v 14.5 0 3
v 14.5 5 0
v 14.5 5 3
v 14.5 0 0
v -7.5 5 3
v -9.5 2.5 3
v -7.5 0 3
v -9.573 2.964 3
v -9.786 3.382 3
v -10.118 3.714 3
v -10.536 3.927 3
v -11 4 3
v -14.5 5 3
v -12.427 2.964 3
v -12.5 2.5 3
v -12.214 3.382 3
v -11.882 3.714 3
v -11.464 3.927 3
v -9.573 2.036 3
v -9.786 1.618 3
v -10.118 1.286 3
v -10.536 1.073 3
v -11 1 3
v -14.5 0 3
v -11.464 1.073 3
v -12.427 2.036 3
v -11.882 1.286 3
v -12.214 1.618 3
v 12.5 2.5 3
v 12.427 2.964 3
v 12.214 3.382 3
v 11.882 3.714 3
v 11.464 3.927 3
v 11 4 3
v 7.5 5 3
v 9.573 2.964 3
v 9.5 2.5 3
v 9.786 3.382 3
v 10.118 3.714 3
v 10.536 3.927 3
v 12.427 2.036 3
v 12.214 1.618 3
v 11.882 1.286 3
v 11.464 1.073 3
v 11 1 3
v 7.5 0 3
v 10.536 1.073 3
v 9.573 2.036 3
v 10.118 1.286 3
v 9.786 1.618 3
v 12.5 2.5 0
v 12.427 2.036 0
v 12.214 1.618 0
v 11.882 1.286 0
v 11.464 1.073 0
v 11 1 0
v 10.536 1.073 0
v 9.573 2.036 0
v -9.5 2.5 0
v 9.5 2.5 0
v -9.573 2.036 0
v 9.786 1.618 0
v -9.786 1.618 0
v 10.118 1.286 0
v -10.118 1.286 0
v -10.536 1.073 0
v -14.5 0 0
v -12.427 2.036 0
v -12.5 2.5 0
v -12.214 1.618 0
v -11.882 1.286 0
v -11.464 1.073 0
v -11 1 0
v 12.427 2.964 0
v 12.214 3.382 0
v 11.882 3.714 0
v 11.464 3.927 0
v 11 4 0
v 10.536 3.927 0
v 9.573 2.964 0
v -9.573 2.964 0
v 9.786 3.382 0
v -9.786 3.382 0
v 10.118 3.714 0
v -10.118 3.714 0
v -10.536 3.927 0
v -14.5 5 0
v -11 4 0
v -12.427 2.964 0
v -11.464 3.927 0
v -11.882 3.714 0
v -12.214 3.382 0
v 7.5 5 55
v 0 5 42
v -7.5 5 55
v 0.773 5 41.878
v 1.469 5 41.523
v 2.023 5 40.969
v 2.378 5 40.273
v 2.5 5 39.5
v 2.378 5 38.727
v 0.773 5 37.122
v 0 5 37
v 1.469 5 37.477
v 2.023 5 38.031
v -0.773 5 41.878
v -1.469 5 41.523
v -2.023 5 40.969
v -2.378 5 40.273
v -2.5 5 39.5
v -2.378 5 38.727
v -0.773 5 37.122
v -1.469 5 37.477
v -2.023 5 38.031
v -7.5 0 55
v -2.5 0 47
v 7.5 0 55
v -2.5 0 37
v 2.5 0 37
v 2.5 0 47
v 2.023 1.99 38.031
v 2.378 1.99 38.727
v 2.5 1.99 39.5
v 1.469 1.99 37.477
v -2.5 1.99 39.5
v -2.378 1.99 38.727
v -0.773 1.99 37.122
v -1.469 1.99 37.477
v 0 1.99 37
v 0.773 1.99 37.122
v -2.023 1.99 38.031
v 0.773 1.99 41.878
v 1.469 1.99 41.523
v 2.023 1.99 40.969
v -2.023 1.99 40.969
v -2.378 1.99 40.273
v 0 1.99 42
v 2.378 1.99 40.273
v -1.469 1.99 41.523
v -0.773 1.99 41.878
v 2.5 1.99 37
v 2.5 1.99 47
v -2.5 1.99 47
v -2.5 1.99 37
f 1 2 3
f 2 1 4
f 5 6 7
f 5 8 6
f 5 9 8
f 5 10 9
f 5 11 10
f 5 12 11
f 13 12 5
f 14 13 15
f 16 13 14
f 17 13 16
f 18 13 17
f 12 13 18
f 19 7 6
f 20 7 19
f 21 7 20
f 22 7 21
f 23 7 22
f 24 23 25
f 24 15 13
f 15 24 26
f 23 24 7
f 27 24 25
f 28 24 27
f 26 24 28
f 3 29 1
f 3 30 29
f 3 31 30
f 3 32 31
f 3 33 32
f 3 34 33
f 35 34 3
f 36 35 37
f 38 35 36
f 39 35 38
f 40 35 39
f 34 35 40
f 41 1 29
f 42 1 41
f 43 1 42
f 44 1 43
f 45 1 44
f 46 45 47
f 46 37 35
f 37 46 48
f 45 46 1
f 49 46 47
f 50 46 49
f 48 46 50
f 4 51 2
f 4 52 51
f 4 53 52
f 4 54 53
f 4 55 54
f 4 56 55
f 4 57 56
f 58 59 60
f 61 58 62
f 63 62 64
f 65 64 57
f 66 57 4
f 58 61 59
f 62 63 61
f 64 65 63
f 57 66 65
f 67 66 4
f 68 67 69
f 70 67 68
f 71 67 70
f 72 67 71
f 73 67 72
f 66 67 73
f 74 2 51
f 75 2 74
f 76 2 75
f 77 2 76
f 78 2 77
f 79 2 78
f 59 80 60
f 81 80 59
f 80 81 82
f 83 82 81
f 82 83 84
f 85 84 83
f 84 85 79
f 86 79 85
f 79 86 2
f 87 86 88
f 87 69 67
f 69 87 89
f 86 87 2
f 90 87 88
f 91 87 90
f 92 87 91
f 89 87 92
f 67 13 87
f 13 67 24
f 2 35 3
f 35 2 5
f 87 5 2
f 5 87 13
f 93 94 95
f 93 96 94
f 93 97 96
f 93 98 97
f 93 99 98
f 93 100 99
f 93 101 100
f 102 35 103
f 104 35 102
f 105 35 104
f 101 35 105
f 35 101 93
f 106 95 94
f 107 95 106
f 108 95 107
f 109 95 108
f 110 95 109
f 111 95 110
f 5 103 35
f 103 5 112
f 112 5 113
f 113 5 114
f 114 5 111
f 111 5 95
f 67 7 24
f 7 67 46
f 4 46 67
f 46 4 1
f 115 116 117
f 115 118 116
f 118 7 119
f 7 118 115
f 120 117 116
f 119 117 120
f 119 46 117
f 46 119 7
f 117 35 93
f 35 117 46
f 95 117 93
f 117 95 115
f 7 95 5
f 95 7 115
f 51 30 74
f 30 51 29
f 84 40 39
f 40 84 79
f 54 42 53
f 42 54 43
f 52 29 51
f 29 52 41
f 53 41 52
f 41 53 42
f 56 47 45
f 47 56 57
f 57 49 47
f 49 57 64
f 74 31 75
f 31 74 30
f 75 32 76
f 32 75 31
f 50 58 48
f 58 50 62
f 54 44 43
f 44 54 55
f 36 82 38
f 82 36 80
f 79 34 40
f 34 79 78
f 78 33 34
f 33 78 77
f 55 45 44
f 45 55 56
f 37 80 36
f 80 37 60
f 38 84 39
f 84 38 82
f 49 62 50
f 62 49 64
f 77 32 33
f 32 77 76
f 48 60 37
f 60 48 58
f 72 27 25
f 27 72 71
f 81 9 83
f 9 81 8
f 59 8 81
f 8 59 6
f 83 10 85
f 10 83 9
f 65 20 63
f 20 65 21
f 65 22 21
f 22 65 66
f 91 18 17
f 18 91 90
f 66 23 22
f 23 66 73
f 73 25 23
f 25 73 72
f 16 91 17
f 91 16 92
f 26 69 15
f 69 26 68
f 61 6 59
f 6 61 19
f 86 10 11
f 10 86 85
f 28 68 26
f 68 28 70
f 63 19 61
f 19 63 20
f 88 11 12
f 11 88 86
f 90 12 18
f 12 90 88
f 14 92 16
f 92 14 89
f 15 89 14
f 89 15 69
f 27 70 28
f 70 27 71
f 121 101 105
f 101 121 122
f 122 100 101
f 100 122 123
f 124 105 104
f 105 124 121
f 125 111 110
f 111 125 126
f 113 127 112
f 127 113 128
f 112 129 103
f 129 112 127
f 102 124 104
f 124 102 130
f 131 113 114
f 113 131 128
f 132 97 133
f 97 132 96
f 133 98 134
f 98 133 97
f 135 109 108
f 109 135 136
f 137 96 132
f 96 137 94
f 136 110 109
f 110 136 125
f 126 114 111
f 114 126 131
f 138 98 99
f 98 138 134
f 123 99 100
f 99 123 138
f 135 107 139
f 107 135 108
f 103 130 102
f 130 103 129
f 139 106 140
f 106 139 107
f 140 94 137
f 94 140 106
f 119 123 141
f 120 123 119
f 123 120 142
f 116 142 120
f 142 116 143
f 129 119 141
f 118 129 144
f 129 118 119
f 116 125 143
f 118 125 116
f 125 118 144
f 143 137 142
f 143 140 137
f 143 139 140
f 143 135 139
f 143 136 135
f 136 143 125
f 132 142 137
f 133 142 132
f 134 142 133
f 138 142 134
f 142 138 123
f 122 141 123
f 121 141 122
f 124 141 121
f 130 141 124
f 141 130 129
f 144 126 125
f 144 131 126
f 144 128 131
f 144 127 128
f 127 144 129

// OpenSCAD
//the encoder is based off of the KY-040 Arduino Rotary Encoder

$fn = 20;
//encoder size 
encoderx = 5;
encodery = 2;
encoderz = 10;
//thickness of the whole assembly
thickness = 5;
//height of center of shaft from floor
encodershaftheight = 42;
//height of encoder after the shaft
heightaboveshaft = 5;
//surronding wall of encoder
wallsurrond = 5;
//hole for wires to exit from back
wireexitholedia = 5;
//mounting bolts
mountboltdia = 3;
mountthick = 3;
mountboltsurrond = 2;

difference(){
    union(){
        //mount
        translate([-((encoderx+thickness*2)+(mountboltdia+mountboltsurrond*2)*2)/2,-(0)/2,0]){cube([(encoderx+thickness*2)+(mountboltdia+mountboltsurrond*2)*2, thickness,mountthick]);}
        //top
        translate([-(encoderx+thickness*2)/2,(0)/2,mountthick]){cube([encoderx+thickness*2,thickness,encodershaftheight++heightaboveshaft+thickness]);}
    }
    
    union(){
        //mounting
        translate([((encoderx+thickness*2)/2+((mountboltdia+mountboltsurrond*2))/2),thickness/2,-1]){cylinder(r = mountboltdia/2, h = mountthick+2);}
        translate([-((encoderx+thickness*2)/2+((mountboltdia+mountboltsurrond*2))/2),thickness/2,-1]){cylinder(r = mountboltdia/2, h = mountthick+2);}
        //wires exit
        translate([0,0,(encodershaftheight+heightaboveshaft-encoderz)+wireexitholedia/2]){rotate(a = [270,0,0]){cylinder(r = wireexitholedia/2, h = thickness + 1);}}
        //encoder
        translate([-(encoderx)/2,-.01,encodershaftheight+heightaboveshaft-encoderz]){cube([encoderx, encodery, encoderz]);}
    }
}
